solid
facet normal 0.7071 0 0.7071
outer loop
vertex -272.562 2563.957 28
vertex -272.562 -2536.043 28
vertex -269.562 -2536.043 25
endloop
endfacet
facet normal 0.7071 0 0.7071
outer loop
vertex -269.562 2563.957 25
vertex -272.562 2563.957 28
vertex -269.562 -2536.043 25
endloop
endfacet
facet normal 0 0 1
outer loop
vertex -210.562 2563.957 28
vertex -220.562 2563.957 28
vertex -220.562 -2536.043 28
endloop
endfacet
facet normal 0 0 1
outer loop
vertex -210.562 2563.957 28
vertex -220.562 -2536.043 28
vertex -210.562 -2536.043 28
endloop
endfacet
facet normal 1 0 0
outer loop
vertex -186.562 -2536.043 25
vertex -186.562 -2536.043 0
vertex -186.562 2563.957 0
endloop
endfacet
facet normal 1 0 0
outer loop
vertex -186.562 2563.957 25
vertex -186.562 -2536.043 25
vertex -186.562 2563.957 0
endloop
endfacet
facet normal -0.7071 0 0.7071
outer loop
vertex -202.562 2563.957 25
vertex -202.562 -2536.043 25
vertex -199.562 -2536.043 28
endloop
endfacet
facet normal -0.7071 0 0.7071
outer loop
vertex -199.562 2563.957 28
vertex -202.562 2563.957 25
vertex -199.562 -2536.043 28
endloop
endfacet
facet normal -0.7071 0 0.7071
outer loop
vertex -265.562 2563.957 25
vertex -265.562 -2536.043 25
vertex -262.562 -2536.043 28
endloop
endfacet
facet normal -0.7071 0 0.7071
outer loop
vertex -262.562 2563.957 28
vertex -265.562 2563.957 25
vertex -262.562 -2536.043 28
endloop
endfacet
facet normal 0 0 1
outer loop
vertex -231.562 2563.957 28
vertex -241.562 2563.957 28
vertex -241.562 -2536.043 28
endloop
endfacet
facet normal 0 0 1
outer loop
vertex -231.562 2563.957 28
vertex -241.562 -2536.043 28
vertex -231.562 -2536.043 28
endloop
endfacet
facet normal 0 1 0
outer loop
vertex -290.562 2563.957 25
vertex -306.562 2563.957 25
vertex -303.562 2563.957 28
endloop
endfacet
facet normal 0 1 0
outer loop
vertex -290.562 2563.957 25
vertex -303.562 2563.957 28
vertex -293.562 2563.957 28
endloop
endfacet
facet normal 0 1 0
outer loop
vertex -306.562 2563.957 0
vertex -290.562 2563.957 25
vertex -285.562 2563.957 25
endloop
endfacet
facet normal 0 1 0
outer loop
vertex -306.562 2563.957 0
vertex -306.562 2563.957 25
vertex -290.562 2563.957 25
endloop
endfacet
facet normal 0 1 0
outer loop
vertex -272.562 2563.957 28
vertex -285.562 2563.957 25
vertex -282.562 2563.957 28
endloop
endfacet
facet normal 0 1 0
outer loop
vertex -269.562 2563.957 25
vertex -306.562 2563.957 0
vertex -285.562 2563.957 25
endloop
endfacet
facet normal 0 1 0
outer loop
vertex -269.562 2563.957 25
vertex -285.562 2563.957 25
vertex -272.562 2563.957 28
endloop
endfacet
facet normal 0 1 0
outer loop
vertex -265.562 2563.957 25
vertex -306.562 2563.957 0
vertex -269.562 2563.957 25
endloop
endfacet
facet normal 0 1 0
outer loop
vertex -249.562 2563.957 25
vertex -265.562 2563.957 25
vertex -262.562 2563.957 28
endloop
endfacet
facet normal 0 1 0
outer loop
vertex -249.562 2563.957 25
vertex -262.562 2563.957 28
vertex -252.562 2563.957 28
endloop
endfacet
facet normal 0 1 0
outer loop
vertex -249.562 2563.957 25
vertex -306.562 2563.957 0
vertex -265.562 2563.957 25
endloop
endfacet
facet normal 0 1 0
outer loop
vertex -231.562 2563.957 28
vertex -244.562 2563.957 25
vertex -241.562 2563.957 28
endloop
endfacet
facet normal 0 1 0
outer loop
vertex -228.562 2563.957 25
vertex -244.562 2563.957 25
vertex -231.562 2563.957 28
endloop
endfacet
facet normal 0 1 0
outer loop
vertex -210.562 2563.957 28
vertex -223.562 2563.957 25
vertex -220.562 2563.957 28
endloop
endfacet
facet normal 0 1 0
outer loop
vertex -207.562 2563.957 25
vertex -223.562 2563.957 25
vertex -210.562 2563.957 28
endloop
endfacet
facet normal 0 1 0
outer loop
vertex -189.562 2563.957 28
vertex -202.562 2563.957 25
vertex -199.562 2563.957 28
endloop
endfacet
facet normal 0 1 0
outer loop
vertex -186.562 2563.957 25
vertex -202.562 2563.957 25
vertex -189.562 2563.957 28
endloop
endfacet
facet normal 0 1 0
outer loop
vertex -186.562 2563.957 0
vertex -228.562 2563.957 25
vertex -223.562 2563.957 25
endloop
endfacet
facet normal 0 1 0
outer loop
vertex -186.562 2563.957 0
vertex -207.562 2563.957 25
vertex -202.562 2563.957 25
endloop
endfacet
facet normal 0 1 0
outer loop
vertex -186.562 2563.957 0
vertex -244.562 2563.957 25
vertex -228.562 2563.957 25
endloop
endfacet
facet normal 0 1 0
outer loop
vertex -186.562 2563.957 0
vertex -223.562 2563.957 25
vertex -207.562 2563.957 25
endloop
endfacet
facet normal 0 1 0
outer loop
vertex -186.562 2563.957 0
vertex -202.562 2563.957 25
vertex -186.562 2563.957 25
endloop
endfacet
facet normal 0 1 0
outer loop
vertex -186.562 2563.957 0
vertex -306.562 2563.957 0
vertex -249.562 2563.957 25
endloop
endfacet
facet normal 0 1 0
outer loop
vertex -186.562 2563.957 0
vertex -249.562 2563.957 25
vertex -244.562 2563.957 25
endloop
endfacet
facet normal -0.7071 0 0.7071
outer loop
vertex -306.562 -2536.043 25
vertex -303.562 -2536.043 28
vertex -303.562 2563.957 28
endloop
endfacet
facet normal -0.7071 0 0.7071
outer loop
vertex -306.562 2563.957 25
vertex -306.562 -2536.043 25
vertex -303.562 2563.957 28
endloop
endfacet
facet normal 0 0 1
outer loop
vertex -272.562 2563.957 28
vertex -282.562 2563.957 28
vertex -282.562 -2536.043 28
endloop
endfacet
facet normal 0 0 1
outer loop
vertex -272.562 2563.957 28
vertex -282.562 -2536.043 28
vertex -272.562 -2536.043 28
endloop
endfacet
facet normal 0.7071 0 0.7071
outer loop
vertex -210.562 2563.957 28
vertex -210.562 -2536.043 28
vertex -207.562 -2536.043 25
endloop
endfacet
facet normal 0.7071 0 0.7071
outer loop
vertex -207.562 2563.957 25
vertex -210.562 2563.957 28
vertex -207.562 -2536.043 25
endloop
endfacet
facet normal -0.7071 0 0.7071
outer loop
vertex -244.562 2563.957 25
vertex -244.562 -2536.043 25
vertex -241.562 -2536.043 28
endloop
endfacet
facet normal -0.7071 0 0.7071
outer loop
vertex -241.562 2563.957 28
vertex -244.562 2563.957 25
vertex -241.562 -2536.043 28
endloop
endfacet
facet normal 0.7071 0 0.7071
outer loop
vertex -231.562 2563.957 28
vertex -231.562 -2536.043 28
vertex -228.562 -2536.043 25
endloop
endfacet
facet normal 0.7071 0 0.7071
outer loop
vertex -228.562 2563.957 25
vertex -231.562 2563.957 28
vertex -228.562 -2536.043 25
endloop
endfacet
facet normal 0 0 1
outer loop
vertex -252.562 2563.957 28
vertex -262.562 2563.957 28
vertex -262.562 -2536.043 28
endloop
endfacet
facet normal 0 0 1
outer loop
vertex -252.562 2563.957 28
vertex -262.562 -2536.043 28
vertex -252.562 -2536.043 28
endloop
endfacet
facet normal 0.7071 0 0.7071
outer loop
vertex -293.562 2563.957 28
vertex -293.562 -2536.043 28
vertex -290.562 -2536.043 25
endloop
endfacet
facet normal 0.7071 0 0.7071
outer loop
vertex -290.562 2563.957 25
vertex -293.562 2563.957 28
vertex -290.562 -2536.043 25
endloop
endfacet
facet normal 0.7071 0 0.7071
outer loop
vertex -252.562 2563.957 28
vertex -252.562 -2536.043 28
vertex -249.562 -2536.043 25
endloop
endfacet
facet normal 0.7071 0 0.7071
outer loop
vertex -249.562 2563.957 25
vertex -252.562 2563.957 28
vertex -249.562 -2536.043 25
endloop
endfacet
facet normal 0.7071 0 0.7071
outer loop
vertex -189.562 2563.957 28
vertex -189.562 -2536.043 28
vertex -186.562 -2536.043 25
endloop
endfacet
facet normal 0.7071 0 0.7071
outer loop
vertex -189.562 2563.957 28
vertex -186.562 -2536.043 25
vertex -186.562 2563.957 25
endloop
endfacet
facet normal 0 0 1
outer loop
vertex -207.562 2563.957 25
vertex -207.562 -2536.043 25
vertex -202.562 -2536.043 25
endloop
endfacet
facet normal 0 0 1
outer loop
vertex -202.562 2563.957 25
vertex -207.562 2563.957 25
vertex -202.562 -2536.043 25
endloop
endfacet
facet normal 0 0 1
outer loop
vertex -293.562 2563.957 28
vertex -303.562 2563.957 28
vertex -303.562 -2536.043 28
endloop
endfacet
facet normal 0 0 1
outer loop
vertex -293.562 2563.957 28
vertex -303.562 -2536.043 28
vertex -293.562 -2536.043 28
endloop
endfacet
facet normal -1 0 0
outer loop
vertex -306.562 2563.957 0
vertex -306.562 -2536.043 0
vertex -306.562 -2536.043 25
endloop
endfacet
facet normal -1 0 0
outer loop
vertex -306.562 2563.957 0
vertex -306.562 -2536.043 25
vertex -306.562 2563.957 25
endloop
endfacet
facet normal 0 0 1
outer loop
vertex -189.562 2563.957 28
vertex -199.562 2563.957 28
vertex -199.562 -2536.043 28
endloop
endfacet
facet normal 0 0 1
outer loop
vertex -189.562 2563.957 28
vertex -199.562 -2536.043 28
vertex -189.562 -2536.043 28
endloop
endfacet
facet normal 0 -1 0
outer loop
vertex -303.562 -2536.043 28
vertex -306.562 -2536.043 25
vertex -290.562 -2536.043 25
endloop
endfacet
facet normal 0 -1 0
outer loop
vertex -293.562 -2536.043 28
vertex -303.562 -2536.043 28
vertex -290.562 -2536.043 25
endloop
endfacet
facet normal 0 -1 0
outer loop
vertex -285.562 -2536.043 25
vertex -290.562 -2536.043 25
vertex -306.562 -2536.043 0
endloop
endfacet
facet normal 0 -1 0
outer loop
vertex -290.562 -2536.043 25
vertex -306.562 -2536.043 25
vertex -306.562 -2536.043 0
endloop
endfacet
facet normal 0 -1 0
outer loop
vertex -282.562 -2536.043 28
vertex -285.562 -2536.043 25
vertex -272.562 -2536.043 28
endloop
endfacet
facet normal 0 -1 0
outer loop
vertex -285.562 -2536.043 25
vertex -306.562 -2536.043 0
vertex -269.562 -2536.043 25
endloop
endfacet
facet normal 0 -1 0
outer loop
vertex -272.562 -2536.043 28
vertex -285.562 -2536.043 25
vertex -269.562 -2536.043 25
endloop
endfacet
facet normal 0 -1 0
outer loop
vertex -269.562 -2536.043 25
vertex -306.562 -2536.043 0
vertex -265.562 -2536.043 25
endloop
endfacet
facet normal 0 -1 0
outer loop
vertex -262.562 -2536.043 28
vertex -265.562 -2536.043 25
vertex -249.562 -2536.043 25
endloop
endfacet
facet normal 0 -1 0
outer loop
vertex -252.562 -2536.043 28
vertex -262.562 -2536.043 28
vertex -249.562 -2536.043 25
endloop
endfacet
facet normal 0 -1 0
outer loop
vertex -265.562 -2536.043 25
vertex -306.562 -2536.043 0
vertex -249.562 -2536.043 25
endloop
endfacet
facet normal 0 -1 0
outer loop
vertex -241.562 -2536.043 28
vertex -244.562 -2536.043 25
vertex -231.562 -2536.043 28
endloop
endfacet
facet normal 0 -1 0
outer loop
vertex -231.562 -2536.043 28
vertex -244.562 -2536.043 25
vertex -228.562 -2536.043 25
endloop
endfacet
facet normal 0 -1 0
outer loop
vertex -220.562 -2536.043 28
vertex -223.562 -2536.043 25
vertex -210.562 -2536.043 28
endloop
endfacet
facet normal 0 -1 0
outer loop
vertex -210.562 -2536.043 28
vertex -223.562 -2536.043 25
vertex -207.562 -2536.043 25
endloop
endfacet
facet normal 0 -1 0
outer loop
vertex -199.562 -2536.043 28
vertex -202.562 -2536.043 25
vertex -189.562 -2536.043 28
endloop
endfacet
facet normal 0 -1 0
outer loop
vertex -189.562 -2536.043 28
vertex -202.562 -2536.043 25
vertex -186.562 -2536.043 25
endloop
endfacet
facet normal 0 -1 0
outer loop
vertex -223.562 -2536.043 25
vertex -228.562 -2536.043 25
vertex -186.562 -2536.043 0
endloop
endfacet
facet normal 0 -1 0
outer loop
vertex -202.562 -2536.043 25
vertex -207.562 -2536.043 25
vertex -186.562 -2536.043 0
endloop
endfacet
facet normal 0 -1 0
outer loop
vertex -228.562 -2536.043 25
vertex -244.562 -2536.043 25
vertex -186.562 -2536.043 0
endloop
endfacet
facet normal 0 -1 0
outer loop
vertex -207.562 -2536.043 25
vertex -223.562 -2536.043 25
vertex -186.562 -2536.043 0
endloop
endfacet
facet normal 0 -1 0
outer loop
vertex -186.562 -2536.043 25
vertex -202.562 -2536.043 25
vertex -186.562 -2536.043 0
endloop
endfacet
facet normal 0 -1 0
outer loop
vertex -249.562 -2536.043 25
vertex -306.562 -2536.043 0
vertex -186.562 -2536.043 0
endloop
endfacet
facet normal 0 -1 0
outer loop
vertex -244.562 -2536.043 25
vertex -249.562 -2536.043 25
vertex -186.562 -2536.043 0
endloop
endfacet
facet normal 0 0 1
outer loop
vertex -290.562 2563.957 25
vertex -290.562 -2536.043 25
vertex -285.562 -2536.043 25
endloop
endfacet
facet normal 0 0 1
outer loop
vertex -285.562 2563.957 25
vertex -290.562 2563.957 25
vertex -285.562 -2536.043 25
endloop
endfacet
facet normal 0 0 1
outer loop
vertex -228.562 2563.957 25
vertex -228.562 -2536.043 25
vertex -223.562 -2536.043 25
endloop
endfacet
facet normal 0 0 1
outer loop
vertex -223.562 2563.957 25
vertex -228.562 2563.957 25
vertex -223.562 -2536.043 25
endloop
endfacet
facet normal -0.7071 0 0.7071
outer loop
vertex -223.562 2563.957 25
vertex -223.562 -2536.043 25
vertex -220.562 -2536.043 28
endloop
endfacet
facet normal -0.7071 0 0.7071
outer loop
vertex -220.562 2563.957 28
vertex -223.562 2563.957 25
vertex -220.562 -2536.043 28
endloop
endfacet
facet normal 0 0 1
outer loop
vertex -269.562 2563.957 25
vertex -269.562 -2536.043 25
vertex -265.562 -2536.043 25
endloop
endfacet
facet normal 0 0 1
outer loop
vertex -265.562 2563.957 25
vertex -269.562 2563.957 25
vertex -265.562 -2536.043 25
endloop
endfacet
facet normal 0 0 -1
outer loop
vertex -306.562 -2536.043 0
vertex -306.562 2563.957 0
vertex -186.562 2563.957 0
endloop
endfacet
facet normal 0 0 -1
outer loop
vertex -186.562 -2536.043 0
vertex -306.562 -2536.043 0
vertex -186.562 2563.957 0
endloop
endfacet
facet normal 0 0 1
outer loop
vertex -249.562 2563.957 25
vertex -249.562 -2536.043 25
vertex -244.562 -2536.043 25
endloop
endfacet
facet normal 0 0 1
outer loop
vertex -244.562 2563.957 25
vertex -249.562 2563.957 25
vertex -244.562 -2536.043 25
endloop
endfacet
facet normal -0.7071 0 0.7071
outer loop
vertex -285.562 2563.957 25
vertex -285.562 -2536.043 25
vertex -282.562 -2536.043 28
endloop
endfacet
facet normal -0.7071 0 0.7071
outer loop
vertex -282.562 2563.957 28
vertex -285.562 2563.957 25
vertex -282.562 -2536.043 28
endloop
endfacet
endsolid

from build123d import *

# Parameters (mm, degrees)
F0_W     = 120
F0_H     = 5100
F1_DEPTH = 28
F2_SIZE  = 3
F4_DEPTH = 5100


with BuildPart() as f1:
    # F0 (on Top) → F1 (new body)
    with BuildSketch(Plane.XY):
        with Locations((-246.562249, 13.956866)):
            Rectangle(F0_W, F0_H)
    extrude(amount=F1_DEPTH)

    # F2
    f2_edges = [f1.edges().sort_by_distance(p)[0] for p in [
        (-306.562249, 13.956866, 28),
        (-186.562249, 13.956866, 28),
    ]]
    chamfer(f2_edges, length=F2_SIZE)

    # F3 (on face) → F4 (cut)
    with BuildSketch(Plane.XZ.offset(2536.043134)):
        Polygon((-282.562249, 28), (-293.562249, 28), (-290.562249, 25), (-285.562249, 25), align=None)
        Polygon((-262.562249, 28), (-272.562249, 28), (-269.562249, 25), (-265.562249, 25), align=None)
        Polygon((-241.562249, 28), (-252.562249, 28), (-249.562249, 25), (-244.562249, 25), align=None)
        Polygon((-223.562249, 25), (-220.562249, 28), (-231.562249, 28), (-228.562249, 25), align=None)
        Polygon((-202.562249, 25), (-199.562249, 28), (-210.562249, 28), (-207.562249, 25), align=None)
    extrude(amount=-F4_DEPTH, mode=Mode.SUBTRACT)


solid = f1.part
